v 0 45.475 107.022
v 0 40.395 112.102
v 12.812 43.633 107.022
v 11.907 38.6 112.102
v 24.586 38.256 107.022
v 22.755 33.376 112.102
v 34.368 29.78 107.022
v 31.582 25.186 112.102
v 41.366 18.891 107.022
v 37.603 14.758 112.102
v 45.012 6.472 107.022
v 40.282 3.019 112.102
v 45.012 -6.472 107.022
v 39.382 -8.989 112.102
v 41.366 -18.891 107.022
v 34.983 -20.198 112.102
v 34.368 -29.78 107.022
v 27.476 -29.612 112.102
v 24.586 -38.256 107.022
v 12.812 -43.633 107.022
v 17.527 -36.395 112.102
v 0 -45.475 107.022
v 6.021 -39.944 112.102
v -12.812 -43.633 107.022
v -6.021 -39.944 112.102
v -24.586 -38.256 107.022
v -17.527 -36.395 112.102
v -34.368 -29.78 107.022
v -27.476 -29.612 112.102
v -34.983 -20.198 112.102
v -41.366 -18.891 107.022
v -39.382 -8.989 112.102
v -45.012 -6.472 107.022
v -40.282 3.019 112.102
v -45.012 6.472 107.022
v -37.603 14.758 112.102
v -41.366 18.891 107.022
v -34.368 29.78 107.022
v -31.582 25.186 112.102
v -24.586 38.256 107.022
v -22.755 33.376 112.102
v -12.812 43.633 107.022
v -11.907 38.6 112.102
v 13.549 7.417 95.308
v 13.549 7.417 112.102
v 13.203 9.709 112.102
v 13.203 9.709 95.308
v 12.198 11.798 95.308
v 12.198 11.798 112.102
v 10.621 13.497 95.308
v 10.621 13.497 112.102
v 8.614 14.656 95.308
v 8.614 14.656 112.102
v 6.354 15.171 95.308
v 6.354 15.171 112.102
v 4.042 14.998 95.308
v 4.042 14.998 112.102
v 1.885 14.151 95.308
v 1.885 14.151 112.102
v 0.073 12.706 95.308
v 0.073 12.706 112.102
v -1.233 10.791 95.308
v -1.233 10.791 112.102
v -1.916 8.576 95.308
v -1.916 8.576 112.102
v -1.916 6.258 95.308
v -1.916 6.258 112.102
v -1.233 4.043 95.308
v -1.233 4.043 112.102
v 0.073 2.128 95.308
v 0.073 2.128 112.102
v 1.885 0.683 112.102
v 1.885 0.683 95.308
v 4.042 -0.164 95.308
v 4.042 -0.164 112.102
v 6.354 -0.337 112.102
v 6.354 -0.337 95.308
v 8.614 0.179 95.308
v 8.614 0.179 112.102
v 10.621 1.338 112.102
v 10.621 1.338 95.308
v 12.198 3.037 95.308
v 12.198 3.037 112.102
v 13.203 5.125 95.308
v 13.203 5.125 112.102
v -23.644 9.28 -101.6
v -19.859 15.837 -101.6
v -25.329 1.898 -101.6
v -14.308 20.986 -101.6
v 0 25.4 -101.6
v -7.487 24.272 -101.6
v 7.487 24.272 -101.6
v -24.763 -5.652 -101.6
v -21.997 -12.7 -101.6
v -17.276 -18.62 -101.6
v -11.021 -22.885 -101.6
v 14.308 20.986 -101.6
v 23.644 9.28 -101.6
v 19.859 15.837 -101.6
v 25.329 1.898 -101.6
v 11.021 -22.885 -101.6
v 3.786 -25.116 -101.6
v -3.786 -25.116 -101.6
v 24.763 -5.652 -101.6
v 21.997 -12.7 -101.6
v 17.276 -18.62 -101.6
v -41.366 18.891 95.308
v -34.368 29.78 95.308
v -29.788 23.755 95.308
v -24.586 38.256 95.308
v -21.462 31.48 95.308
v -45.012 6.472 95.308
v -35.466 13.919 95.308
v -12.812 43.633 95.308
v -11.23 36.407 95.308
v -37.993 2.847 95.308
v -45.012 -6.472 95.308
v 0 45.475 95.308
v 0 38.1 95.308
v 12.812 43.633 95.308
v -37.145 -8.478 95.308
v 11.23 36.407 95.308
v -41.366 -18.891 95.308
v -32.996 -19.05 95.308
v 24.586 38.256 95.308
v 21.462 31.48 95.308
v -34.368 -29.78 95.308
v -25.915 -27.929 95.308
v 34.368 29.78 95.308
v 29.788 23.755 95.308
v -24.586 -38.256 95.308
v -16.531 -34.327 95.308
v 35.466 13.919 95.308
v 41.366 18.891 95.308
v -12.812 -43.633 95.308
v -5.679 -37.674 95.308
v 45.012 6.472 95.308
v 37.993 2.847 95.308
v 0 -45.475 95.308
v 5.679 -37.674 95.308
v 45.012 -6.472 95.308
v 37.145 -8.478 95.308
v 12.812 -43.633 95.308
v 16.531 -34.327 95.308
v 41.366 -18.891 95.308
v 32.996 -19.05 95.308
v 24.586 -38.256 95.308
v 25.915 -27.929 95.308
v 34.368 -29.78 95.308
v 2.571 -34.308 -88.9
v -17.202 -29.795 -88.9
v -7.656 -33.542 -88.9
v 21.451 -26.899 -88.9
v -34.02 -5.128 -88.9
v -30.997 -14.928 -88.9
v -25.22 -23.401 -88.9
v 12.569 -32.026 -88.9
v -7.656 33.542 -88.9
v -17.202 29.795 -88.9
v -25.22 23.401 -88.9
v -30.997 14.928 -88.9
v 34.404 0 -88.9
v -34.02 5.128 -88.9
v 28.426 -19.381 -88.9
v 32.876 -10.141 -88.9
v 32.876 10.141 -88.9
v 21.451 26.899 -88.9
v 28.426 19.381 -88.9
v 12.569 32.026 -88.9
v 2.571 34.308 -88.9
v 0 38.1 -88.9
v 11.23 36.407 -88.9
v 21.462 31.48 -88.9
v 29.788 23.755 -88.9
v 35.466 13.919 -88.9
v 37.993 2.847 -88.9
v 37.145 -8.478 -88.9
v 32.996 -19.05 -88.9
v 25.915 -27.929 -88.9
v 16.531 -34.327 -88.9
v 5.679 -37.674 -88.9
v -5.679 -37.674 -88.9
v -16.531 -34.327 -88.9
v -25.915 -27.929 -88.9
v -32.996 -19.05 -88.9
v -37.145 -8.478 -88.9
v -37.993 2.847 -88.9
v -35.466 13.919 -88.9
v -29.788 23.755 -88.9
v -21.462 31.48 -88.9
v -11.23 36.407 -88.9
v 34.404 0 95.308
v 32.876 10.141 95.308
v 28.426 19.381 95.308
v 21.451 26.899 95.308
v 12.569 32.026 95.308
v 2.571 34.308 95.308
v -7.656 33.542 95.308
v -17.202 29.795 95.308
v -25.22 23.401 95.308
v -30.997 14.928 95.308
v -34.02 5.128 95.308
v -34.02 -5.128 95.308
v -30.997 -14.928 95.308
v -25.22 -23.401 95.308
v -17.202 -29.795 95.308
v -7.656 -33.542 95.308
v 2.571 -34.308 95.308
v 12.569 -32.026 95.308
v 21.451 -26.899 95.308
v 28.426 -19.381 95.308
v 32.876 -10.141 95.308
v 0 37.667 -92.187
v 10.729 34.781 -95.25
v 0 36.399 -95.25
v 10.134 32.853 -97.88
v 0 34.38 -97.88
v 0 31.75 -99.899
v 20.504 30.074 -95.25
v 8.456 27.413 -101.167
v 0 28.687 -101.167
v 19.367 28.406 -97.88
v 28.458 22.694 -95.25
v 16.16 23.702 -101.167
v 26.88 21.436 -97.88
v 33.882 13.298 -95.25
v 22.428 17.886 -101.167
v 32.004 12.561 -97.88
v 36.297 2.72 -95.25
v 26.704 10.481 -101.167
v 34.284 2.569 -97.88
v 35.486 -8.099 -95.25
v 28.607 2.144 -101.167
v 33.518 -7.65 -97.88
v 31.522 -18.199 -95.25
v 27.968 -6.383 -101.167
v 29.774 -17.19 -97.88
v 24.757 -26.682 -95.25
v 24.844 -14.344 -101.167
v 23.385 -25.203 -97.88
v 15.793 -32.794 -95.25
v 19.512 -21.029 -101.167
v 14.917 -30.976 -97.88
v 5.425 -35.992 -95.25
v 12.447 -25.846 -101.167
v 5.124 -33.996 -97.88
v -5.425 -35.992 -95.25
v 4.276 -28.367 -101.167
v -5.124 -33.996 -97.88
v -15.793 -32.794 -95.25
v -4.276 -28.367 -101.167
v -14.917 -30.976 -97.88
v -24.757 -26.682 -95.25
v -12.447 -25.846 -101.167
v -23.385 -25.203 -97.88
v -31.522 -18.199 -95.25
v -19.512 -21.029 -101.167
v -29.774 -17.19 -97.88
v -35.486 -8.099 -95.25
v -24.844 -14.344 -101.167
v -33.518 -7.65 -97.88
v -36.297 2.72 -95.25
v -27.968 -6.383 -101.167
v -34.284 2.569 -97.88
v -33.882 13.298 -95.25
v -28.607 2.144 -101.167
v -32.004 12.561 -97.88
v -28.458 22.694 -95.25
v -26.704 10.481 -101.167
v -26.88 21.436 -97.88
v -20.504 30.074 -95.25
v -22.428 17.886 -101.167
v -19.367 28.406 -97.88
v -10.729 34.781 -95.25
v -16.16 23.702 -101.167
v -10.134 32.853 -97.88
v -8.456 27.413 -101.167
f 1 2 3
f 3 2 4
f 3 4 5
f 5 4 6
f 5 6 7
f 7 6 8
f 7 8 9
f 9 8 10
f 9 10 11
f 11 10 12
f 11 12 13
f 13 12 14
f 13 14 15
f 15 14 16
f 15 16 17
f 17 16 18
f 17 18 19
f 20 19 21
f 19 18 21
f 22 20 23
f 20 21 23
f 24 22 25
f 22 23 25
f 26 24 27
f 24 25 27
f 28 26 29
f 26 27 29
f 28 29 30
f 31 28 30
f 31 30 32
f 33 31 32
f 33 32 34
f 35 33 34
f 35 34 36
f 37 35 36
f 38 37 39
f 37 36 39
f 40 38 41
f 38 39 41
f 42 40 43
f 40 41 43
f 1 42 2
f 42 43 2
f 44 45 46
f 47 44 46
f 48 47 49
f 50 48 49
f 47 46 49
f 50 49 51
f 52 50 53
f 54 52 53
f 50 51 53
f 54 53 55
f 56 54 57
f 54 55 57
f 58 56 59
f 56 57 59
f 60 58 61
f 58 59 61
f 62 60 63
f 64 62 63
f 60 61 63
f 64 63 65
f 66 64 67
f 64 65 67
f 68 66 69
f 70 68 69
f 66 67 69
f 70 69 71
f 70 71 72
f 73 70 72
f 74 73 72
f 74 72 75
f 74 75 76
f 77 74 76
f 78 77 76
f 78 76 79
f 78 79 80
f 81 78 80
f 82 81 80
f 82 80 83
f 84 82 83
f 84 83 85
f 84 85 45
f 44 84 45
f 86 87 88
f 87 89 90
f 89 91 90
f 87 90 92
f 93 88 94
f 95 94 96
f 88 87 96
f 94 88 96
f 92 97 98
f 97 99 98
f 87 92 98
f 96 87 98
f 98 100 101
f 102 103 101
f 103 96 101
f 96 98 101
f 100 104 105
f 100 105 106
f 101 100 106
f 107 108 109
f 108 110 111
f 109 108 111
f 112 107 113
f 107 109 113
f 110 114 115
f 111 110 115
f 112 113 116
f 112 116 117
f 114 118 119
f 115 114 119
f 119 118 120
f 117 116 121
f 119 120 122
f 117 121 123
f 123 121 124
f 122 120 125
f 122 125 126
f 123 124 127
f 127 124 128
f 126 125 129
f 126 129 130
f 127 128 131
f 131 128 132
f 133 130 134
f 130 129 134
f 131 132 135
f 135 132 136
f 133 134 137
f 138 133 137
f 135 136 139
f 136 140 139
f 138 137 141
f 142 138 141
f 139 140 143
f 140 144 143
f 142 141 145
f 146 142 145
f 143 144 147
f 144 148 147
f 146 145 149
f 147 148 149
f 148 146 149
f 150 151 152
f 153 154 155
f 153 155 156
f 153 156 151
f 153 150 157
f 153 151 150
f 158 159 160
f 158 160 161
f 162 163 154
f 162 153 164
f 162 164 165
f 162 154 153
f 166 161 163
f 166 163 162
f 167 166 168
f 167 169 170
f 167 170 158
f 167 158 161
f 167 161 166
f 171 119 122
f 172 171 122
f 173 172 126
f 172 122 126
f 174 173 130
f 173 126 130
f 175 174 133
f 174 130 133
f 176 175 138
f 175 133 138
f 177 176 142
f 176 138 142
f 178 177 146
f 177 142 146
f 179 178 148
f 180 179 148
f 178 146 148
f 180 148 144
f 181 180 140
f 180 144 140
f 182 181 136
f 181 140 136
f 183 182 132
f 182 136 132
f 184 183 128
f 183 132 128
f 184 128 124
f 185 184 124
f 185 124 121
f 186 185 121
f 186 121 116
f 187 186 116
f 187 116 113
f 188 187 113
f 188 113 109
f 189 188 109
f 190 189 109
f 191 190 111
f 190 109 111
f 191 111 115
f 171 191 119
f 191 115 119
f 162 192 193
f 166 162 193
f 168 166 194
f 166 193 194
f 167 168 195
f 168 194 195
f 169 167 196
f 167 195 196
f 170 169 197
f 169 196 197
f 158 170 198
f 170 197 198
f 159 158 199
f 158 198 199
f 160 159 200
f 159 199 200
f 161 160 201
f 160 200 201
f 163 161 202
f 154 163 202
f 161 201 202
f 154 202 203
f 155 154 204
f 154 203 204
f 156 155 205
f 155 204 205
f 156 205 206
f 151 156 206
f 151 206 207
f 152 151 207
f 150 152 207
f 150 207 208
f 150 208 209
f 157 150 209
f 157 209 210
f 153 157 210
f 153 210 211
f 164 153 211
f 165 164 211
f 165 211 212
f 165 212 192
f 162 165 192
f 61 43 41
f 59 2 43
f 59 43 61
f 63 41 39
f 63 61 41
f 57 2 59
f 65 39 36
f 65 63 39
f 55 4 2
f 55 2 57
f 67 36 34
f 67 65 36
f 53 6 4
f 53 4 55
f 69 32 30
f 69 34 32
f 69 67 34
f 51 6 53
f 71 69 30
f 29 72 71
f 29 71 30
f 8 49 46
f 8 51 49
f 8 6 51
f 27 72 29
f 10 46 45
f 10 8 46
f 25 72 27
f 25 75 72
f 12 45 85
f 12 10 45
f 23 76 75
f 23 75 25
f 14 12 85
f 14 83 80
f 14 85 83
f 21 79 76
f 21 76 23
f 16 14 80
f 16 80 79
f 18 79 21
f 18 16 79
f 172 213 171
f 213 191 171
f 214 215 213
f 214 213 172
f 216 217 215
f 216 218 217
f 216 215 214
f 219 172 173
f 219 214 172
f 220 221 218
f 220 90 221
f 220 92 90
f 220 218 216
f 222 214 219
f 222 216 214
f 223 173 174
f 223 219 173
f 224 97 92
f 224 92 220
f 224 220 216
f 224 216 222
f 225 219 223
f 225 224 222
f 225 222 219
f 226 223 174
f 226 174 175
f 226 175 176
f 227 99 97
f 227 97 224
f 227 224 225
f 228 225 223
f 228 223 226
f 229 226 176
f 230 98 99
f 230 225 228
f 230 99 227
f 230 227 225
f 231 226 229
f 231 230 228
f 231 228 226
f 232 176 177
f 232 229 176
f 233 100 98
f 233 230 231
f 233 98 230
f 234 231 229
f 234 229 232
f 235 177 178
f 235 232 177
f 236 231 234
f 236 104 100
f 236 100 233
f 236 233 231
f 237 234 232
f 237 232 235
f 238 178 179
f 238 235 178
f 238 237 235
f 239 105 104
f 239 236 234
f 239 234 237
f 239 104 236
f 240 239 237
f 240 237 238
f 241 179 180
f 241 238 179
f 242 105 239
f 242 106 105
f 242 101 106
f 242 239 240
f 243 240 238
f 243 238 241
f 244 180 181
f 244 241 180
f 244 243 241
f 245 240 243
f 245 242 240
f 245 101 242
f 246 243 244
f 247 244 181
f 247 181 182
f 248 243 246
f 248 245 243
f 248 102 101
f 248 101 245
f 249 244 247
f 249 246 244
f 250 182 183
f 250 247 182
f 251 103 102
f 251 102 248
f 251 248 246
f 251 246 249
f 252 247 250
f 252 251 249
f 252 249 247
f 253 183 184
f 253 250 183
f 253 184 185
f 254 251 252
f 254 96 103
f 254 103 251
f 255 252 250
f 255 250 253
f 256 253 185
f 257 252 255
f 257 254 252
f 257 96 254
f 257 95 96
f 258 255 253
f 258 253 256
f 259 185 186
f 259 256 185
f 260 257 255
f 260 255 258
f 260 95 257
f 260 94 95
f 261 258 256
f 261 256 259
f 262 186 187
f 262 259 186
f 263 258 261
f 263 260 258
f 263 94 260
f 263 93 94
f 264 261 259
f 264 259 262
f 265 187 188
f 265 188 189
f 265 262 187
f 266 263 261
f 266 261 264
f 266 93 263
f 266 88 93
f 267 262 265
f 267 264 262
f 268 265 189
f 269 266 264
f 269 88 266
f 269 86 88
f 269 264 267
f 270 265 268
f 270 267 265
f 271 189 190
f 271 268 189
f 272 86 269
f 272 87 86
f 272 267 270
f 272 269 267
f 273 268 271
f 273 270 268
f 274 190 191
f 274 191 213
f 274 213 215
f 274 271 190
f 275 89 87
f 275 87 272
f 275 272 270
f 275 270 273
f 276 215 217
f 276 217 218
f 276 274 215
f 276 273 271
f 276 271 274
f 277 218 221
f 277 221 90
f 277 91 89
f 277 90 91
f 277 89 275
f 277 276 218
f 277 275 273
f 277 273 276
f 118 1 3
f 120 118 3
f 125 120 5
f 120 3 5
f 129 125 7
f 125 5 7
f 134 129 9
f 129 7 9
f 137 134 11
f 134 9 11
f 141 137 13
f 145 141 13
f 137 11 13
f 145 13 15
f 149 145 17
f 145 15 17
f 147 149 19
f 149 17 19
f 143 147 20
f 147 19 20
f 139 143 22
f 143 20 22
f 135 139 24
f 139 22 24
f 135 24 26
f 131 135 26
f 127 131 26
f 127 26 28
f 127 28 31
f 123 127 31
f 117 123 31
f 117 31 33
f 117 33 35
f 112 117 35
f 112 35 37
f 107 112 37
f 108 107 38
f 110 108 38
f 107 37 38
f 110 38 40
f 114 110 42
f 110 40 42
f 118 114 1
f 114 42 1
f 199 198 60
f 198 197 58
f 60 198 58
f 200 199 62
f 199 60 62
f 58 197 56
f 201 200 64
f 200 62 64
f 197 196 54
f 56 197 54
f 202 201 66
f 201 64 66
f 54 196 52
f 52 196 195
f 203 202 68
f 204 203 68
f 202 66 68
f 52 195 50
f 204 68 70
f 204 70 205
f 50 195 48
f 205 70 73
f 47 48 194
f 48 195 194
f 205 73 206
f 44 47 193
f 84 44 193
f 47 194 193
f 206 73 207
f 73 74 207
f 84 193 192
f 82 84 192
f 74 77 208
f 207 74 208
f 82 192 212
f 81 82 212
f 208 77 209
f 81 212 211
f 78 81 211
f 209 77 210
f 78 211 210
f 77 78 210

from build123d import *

# Parameters (mm, degrees)
F2_R      = 34.4044739417
F3_DEPTH  = 190.5
F6_R      = 12.7
F8_W      = 45.4750240587
F8_H      = 16.7945176363
F10_R     = 7.7759121847
F11_DEPTH = 177.8
F12_SIZE  = 5.08


# Not quite as in the source:
# - a fillet or chamfer that OpenCascade refuses, or shapes differently, is made with other operations: its cross-section is extruded or revolved along the edge and cut away or added
# - the program builds the solid bodies; features that only make, move or delete a surface that nothing else refers to are left out


with BuildPart() as f1:
    # F0 (on Right) → F1 (revolve)
    with BuildSketch(Plane.YZ):
        Polygon((38.1, -101.6), (38.1, 0), (38.1, 101.6), (0, 101.6), (0, 0), (0, -101.6), align=None)
    revolve(axis=Axis((0, 0, -50.8), (0, 0, -1)))

    # F2 (on face) → F3 (cut)
    with BuildSketch(Plane.XY.offset(101.6)):
        Circle(F2_R)
    extrude(amount=-F3_DEPTH, mode=Mode.SUBTRACT)

    # F6
    f6_edges = [f1.edges().sort_by_distance(p)[0] for p in [
        (0, -38.1, -101.6),
    ]]
    fillet(f6_edges, radius=F6_R)

    # F7: fillet of radius 5.08 on 1 edges, made by hand

    # F7_s1 → F7_t2 (revolve, cut)
    with BuildSketch(Plane.YZ):
        with BuildLine():
            ThreePointArc((38.1, 96.52), (36.6121024484, 100.1121024484), (33.02, 101.6))
            Line((33.02, 101.6), (38.1, 101.6))
            Line((38.1, 101.6), (38.1, 96.52))
        make_face()
    revolve(axis=Axis((0, 0, 101.6), (0, 0, -1)), mode=Mode.SUBTRACT)

    # F8 (on Right) → F9 (revolve)
    with BuildSketch(Plane.YZ):
        with Locations((22.7375120293, 103.7051230669)):
            Rectangle(F8_W, F8_H)
    revolve(axis=Axis((0, 0, 103.7051230669), (0, 0, -1)))

    # F10 (on face) → F11 (cut)
    with BuildSketch(Plane.XY.offset(112.1023818851)):
        with Locations((5.7727694511, 7.4173058383)):
            Circle(F10_R)
    extrude(amount=-F11_DEPTH, mode=Mode.SUBTRACT)

    # F12
    f12_edges = [f1.edges().sort_by_distance(p)[0] for p in [
        (0, -45.475024, 112.102382),
    ]]
    chamfer(f12_edges, length=F12_SIZE)


solid = f1.part
